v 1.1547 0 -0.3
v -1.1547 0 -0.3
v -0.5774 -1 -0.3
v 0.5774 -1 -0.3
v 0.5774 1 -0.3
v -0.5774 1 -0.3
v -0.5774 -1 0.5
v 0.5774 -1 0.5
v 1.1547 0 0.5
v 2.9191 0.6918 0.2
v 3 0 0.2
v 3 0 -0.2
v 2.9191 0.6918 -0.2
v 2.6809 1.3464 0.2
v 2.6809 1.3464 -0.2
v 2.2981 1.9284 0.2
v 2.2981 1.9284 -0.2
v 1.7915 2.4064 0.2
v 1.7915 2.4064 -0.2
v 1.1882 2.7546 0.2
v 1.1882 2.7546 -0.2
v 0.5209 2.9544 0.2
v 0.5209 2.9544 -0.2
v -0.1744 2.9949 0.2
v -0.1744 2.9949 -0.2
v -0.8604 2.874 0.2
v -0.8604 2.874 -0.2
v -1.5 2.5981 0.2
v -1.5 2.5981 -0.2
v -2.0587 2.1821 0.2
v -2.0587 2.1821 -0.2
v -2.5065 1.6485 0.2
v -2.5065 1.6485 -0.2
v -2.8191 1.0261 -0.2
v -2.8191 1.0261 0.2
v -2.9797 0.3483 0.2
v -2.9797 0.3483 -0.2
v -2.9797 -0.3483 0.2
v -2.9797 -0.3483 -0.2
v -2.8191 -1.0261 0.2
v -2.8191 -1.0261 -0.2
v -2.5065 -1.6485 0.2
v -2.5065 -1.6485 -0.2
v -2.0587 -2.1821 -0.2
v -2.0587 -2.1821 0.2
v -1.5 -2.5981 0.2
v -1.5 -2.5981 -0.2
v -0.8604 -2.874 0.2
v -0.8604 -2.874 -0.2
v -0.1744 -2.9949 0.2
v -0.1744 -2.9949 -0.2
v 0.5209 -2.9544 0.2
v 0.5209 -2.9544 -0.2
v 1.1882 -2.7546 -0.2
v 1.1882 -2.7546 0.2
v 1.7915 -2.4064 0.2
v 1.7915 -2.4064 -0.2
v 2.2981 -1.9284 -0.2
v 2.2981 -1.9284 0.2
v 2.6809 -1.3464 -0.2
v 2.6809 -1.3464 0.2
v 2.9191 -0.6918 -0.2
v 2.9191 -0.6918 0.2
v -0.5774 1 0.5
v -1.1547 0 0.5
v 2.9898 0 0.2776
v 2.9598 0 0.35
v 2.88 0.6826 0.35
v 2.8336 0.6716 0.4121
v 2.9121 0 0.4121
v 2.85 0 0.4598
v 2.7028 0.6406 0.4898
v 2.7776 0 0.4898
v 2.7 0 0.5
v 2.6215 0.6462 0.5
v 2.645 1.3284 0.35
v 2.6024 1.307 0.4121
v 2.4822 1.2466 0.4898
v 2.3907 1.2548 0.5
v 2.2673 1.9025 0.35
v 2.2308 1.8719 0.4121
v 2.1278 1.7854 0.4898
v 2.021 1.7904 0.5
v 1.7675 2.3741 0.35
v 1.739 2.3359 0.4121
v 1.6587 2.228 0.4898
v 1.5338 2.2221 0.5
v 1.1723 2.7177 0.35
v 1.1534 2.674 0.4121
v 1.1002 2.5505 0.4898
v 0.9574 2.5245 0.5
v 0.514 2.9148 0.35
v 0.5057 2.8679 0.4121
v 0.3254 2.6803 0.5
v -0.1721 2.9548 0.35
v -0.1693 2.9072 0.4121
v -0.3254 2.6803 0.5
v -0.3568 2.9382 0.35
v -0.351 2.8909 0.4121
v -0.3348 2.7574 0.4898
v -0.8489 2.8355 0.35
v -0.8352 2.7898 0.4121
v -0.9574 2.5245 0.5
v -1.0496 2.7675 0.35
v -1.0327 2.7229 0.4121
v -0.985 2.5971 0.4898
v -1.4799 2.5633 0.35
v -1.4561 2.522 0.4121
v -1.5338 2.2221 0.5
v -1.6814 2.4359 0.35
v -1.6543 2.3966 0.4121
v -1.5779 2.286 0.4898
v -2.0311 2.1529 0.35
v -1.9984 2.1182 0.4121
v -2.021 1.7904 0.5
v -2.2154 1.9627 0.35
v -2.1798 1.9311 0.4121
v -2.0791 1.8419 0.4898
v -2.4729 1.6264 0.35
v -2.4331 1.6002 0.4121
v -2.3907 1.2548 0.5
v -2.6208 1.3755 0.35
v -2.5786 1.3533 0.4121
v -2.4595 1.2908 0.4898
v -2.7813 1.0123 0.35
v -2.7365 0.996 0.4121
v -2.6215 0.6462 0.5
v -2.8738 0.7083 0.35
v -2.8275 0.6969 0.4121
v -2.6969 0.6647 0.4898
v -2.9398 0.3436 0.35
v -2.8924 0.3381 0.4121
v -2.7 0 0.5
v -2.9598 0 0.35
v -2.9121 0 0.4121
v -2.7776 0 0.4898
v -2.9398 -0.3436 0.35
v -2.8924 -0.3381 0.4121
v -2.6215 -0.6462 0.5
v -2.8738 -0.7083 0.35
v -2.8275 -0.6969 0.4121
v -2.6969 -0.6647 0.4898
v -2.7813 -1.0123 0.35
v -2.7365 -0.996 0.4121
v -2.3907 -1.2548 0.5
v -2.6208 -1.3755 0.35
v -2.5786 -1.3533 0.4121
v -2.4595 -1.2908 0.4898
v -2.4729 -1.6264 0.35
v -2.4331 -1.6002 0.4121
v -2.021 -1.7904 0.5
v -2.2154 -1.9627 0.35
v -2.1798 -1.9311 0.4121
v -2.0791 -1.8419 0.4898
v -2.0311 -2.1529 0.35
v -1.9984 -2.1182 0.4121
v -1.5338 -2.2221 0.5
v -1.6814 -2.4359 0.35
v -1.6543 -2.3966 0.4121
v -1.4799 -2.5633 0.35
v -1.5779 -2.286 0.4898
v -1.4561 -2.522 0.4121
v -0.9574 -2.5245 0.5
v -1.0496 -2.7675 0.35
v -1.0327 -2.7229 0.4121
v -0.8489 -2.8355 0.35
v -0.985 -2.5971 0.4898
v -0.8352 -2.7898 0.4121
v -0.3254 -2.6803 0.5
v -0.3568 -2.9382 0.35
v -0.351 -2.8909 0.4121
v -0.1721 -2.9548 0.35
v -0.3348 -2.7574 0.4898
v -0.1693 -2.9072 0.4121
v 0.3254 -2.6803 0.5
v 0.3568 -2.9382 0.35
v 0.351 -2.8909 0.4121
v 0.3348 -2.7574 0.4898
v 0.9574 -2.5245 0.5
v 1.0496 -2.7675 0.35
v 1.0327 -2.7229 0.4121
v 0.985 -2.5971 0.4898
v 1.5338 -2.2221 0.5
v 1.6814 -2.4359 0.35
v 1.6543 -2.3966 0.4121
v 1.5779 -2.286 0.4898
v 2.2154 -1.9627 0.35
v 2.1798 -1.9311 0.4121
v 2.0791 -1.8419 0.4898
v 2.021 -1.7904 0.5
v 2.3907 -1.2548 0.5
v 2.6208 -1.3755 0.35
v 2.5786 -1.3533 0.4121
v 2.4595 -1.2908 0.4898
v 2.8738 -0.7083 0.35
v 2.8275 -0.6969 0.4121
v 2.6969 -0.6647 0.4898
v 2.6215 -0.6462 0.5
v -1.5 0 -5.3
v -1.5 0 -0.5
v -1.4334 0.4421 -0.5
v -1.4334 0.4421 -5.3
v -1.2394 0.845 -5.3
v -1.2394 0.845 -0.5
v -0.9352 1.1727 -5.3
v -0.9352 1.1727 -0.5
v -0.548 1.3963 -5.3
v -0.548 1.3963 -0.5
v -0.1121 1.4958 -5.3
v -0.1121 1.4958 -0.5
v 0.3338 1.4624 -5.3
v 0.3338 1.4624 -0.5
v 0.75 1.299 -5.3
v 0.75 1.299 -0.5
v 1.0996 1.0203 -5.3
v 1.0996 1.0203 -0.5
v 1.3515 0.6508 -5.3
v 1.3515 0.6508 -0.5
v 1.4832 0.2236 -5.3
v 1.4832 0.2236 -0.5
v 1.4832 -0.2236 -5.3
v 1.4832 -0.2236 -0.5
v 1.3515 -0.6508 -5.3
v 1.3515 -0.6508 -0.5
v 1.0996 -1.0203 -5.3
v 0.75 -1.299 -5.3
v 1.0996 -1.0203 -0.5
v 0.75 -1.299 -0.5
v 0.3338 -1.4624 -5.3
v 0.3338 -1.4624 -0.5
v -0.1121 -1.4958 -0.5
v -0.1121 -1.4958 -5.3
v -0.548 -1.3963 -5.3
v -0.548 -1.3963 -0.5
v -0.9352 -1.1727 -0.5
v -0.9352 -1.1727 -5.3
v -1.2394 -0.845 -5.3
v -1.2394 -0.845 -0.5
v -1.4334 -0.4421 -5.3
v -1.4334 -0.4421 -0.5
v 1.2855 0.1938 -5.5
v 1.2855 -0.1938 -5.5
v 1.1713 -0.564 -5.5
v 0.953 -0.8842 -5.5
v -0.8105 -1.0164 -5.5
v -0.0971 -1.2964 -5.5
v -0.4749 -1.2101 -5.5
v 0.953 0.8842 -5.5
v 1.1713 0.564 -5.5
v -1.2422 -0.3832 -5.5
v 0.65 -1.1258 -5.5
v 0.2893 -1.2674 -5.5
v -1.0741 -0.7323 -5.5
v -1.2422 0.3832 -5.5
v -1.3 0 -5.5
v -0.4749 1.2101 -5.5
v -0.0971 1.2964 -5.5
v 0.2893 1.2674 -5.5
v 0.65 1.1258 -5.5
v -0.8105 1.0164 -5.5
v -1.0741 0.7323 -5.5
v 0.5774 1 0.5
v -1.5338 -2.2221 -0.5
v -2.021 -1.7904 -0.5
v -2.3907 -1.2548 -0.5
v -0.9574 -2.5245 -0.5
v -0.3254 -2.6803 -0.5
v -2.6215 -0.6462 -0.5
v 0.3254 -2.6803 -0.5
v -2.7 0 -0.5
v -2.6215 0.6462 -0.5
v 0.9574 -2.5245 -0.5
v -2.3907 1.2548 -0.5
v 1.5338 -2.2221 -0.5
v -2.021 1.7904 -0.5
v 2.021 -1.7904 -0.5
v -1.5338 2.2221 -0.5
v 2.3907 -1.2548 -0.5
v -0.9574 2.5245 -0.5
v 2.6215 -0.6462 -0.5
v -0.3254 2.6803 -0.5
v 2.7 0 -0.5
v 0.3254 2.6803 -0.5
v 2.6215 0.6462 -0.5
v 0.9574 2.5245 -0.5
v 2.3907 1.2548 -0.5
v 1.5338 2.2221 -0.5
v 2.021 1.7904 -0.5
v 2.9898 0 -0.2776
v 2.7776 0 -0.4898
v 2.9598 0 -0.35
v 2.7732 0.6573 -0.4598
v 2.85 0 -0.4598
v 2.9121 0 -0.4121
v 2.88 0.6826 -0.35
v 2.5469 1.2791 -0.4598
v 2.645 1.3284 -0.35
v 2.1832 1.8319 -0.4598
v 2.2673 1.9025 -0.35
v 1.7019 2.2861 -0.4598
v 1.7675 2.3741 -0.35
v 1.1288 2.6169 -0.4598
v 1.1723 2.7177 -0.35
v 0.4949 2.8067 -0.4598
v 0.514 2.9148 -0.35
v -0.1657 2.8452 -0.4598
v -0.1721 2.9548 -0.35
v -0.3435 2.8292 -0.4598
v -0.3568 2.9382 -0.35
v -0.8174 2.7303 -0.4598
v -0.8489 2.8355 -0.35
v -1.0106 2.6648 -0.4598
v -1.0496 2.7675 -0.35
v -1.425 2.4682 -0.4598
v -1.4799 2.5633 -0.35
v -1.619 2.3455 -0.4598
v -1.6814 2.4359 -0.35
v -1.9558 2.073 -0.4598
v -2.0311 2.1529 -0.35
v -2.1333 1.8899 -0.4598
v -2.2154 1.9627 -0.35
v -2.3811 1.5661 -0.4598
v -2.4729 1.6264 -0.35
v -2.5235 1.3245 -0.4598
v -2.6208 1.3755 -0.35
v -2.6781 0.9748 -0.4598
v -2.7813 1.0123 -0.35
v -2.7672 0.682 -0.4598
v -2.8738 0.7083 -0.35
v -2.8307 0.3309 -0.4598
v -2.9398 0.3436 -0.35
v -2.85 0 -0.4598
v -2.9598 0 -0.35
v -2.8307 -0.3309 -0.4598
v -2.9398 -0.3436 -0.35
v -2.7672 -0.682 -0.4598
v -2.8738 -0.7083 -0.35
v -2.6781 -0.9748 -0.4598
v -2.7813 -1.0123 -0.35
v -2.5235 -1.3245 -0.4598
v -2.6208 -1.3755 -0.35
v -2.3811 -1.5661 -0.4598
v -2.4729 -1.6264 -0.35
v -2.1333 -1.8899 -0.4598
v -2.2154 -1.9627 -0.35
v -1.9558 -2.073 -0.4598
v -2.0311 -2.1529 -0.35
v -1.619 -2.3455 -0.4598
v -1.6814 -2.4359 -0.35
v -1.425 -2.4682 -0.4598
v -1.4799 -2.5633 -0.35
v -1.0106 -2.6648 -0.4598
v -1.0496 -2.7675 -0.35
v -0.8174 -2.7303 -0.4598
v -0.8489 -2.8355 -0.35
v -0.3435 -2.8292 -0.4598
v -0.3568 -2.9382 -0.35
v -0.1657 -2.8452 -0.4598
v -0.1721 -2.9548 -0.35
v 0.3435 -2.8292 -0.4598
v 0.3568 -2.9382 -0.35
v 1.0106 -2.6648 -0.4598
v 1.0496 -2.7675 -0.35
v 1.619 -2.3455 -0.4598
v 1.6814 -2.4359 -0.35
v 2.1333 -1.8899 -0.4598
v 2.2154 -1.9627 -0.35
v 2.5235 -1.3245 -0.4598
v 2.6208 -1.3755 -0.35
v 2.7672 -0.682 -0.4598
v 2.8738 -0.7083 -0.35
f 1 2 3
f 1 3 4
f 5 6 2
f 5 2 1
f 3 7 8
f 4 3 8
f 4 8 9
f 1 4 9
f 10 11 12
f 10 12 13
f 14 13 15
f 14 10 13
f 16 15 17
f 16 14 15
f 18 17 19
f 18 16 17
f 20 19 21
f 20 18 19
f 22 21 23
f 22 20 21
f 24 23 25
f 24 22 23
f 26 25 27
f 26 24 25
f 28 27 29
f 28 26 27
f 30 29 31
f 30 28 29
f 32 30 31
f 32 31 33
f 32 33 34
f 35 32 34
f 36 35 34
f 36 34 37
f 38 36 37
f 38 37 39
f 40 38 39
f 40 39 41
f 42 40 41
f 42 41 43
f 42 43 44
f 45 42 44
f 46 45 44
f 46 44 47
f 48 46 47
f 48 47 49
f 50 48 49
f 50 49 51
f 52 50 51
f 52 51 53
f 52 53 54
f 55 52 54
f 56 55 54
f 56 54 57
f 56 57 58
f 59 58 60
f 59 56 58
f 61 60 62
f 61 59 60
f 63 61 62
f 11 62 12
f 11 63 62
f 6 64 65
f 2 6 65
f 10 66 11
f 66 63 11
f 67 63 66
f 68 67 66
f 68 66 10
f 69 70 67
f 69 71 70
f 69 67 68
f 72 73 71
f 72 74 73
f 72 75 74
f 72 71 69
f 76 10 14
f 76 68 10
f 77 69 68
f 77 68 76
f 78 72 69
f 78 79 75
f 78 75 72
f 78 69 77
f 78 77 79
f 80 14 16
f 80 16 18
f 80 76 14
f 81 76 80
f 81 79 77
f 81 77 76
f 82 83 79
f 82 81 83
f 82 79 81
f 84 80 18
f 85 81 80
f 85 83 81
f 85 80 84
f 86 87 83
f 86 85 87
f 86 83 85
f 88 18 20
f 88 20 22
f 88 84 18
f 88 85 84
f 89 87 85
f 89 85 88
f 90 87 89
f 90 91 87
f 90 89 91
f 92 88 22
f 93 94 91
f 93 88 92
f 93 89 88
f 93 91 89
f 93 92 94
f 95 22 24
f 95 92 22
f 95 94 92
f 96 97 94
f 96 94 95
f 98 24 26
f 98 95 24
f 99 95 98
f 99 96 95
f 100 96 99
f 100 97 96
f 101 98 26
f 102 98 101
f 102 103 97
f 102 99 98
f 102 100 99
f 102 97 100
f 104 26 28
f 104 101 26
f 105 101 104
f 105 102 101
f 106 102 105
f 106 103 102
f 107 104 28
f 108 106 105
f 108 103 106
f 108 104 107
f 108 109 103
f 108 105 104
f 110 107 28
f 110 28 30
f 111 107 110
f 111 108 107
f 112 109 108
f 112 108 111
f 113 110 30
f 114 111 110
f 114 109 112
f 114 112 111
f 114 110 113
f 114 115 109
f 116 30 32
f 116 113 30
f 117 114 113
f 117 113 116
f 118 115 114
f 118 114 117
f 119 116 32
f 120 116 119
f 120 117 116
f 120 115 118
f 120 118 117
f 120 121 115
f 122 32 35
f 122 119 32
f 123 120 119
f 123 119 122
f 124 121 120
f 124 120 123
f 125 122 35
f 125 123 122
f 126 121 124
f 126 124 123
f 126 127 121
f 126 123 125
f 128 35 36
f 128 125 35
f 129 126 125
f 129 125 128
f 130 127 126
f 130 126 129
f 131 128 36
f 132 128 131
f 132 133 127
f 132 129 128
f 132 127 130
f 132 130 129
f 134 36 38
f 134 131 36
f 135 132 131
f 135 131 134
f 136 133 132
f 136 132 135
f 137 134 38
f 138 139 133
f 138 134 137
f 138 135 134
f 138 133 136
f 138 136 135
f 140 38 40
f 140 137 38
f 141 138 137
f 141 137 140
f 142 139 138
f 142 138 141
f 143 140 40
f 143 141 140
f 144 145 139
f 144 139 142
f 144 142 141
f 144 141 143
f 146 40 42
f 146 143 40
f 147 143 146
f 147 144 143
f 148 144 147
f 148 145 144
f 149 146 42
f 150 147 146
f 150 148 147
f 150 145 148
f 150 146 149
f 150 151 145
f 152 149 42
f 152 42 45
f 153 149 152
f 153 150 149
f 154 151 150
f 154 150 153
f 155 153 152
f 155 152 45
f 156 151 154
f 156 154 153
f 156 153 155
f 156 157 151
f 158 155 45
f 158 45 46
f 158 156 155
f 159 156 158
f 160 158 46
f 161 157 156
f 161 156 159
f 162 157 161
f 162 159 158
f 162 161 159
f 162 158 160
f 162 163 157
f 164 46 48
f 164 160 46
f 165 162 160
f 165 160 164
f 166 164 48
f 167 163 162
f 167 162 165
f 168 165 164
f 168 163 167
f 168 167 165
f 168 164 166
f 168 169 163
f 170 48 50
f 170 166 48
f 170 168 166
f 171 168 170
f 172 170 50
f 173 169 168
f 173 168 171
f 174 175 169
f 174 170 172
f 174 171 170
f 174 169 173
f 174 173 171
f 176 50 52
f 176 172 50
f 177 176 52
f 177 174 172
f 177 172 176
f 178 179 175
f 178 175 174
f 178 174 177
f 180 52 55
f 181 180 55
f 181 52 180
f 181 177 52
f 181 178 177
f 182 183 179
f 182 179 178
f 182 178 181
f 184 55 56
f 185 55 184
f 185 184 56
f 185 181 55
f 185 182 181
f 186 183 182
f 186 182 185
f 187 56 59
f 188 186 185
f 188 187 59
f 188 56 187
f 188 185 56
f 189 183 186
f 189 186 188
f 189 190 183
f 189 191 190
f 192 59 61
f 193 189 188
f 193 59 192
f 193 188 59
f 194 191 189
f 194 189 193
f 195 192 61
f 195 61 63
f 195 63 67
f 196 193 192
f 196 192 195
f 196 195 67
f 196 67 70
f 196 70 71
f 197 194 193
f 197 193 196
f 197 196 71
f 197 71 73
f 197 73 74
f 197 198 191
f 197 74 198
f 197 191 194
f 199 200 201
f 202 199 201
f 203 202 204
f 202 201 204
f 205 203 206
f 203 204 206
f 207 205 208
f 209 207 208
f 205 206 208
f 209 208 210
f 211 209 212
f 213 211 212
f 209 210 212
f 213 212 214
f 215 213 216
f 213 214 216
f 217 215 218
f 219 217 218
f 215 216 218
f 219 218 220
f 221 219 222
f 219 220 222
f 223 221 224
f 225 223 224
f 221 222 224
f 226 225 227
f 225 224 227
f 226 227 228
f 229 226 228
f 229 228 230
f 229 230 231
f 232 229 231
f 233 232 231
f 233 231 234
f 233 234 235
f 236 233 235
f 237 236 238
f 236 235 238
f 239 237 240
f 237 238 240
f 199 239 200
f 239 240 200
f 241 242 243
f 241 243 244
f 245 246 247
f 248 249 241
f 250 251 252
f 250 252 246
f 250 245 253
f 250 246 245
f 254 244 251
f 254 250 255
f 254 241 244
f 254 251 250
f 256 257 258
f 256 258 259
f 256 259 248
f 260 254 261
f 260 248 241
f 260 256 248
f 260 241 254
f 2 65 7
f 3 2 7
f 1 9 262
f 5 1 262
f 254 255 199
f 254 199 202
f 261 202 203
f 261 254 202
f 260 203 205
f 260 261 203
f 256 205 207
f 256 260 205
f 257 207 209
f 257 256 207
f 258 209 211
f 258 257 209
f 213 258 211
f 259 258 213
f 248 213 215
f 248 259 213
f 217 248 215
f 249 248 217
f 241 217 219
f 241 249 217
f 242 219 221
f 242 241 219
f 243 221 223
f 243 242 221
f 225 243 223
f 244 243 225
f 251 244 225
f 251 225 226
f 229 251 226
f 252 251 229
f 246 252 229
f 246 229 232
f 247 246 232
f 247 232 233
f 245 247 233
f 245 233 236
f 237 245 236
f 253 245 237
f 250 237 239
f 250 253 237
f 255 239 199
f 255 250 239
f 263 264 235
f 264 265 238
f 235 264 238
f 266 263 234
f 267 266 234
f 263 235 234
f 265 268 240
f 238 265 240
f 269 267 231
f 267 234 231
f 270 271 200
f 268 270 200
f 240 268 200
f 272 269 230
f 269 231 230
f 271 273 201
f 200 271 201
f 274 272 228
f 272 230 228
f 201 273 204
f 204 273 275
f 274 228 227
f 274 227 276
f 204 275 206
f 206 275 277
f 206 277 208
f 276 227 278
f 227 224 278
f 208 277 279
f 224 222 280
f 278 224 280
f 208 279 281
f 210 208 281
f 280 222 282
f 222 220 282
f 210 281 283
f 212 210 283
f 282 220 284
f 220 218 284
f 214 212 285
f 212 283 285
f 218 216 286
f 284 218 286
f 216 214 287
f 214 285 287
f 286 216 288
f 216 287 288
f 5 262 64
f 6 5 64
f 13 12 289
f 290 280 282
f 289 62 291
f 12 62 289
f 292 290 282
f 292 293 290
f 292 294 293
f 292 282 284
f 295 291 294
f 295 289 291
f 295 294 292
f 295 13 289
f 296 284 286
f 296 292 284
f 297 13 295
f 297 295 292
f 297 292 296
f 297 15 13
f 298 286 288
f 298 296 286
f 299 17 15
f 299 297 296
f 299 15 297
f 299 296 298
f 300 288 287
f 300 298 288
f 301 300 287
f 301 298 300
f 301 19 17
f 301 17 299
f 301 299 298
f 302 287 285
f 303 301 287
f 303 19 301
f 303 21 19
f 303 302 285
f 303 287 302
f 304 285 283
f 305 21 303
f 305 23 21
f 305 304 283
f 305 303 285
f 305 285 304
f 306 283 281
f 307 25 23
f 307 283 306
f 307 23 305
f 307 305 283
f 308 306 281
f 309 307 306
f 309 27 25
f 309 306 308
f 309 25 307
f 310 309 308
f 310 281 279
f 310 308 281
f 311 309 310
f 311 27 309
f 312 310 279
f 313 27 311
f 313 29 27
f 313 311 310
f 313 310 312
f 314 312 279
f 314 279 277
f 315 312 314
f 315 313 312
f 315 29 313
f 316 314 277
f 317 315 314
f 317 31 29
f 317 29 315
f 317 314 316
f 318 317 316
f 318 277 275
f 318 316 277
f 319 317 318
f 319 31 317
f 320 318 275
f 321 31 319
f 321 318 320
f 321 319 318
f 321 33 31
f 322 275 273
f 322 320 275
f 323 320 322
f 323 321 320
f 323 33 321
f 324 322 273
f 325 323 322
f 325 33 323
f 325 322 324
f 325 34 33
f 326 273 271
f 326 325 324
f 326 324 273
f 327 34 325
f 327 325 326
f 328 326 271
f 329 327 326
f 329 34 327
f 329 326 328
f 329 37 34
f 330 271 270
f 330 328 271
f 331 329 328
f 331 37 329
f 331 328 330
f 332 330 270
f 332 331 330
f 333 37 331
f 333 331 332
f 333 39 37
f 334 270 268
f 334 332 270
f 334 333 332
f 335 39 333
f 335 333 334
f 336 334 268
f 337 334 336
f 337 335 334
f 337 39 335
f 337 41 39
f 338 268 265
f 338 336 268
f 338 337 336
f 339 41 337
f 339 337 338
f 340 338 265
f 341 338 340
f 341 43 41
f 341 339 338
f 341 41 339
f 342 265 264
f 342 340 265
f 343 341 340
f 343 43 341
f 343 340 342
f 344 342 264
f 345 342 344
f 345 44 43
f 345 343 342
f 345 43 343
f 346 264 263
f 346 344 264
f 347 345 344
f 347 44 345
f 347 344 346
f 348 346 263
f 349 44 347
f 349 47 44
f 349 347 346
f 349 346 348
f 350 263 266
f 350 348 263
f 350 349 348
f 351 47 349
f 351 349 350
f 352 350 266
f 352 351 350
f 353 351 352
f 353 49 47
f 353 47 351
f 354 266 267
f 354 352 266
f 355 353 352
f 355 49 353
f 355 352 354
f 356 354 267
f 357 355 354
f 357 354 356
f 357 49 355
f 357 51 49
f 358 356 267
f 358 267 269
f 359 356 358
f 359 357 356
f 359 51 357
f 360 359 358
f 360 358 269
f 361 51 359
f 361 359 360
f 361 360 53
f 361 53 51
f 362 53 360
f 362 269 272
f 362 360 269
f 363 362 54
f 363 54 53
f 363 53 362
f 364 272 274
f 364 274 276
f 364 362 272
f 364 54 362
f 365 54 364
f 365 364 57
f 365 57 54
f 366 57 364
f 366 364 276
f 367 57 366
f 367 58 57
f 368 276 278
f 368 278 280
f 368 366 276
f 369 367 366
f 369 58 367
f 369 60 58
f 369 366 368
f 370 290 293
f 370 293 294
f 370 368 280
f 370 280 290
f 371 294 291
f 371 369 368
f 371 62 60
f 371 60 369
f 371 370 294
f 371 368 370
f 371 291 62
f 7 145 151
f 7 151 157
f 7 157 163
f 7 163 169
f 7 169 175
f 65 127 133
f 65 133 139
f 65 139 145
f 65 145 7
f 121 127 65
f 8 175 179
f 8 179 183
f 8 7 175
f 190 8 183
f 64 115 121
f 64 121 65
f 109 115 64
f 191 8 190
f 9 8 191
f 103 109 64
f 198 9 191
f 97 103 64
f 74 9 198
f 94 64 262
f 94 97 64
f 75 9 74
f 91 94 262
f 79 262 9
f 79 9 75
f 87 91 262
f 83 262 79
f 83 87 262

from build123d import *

# Parameters (mm, degrees)
SKETCH_1_R          = 3
EXTRUDE_1_DEPTH     = 0.5
SKETCH_2_R          = 1.5
EXTRUDE_2_DEPTH     = 5
CHAMFER_1_SIZE      = 0.2
CUT_EXTRUDE_1_DEPTH = 0.8
FILLET_2_R          = 0.3


with BuildPart() as part:
    # 草图1 → 凸台-拉伸1 (new body, symmetric)
    with BuildSketch(Plane.XY):
        Circle(SKETCH_1_R)
    extrude(amount=EXTRUDE_1_DEPTH, both=True)

    # 草图2 → 凸台-拉伸2 (add)
    with BuildSketch(Plane(origin=(0, 0, -0.5), x_dir=(-1, 0, 0), z_dir=(0, 0, -1))):
        Circle(SKETCH_2_R)
    extrude(amount=EXTRUDE_2_DEPTH)

    # 倒角1
    chamfer_1_edges = [part.edges().sort_by_distance(p)[0] for p in [
        (1.5, 0, -5.5),
    ]]
    chamfer(chamfer_1_edges, length=CHAMFER_1_SIZE)

    # 草图3 → 切除-拉伸1 (cut)
    with BuildSketch(Plane.XY.offset(0.5)):
        Polygon((1.154700538, 0), (0.577350269, 1), (-0.577350269, 1), (-1.154700538, 0), (-0.577350269, -1), (0.577350269, -1), align=None)
    extrude(amount=-CUT_EXTRUDE_1_DEPTH, mode=Mode.SUBTRACT)

    # 圆角2
    fillet_2_edges = [part.edges().sort_by_distance(p)[0] for p in [
        (-3, 0, -0.5),
        (-3, 0, 0.5),
    ]]
    fillet(fillet_2_edges, radius=FILLET_2_R)


solid = part.part
